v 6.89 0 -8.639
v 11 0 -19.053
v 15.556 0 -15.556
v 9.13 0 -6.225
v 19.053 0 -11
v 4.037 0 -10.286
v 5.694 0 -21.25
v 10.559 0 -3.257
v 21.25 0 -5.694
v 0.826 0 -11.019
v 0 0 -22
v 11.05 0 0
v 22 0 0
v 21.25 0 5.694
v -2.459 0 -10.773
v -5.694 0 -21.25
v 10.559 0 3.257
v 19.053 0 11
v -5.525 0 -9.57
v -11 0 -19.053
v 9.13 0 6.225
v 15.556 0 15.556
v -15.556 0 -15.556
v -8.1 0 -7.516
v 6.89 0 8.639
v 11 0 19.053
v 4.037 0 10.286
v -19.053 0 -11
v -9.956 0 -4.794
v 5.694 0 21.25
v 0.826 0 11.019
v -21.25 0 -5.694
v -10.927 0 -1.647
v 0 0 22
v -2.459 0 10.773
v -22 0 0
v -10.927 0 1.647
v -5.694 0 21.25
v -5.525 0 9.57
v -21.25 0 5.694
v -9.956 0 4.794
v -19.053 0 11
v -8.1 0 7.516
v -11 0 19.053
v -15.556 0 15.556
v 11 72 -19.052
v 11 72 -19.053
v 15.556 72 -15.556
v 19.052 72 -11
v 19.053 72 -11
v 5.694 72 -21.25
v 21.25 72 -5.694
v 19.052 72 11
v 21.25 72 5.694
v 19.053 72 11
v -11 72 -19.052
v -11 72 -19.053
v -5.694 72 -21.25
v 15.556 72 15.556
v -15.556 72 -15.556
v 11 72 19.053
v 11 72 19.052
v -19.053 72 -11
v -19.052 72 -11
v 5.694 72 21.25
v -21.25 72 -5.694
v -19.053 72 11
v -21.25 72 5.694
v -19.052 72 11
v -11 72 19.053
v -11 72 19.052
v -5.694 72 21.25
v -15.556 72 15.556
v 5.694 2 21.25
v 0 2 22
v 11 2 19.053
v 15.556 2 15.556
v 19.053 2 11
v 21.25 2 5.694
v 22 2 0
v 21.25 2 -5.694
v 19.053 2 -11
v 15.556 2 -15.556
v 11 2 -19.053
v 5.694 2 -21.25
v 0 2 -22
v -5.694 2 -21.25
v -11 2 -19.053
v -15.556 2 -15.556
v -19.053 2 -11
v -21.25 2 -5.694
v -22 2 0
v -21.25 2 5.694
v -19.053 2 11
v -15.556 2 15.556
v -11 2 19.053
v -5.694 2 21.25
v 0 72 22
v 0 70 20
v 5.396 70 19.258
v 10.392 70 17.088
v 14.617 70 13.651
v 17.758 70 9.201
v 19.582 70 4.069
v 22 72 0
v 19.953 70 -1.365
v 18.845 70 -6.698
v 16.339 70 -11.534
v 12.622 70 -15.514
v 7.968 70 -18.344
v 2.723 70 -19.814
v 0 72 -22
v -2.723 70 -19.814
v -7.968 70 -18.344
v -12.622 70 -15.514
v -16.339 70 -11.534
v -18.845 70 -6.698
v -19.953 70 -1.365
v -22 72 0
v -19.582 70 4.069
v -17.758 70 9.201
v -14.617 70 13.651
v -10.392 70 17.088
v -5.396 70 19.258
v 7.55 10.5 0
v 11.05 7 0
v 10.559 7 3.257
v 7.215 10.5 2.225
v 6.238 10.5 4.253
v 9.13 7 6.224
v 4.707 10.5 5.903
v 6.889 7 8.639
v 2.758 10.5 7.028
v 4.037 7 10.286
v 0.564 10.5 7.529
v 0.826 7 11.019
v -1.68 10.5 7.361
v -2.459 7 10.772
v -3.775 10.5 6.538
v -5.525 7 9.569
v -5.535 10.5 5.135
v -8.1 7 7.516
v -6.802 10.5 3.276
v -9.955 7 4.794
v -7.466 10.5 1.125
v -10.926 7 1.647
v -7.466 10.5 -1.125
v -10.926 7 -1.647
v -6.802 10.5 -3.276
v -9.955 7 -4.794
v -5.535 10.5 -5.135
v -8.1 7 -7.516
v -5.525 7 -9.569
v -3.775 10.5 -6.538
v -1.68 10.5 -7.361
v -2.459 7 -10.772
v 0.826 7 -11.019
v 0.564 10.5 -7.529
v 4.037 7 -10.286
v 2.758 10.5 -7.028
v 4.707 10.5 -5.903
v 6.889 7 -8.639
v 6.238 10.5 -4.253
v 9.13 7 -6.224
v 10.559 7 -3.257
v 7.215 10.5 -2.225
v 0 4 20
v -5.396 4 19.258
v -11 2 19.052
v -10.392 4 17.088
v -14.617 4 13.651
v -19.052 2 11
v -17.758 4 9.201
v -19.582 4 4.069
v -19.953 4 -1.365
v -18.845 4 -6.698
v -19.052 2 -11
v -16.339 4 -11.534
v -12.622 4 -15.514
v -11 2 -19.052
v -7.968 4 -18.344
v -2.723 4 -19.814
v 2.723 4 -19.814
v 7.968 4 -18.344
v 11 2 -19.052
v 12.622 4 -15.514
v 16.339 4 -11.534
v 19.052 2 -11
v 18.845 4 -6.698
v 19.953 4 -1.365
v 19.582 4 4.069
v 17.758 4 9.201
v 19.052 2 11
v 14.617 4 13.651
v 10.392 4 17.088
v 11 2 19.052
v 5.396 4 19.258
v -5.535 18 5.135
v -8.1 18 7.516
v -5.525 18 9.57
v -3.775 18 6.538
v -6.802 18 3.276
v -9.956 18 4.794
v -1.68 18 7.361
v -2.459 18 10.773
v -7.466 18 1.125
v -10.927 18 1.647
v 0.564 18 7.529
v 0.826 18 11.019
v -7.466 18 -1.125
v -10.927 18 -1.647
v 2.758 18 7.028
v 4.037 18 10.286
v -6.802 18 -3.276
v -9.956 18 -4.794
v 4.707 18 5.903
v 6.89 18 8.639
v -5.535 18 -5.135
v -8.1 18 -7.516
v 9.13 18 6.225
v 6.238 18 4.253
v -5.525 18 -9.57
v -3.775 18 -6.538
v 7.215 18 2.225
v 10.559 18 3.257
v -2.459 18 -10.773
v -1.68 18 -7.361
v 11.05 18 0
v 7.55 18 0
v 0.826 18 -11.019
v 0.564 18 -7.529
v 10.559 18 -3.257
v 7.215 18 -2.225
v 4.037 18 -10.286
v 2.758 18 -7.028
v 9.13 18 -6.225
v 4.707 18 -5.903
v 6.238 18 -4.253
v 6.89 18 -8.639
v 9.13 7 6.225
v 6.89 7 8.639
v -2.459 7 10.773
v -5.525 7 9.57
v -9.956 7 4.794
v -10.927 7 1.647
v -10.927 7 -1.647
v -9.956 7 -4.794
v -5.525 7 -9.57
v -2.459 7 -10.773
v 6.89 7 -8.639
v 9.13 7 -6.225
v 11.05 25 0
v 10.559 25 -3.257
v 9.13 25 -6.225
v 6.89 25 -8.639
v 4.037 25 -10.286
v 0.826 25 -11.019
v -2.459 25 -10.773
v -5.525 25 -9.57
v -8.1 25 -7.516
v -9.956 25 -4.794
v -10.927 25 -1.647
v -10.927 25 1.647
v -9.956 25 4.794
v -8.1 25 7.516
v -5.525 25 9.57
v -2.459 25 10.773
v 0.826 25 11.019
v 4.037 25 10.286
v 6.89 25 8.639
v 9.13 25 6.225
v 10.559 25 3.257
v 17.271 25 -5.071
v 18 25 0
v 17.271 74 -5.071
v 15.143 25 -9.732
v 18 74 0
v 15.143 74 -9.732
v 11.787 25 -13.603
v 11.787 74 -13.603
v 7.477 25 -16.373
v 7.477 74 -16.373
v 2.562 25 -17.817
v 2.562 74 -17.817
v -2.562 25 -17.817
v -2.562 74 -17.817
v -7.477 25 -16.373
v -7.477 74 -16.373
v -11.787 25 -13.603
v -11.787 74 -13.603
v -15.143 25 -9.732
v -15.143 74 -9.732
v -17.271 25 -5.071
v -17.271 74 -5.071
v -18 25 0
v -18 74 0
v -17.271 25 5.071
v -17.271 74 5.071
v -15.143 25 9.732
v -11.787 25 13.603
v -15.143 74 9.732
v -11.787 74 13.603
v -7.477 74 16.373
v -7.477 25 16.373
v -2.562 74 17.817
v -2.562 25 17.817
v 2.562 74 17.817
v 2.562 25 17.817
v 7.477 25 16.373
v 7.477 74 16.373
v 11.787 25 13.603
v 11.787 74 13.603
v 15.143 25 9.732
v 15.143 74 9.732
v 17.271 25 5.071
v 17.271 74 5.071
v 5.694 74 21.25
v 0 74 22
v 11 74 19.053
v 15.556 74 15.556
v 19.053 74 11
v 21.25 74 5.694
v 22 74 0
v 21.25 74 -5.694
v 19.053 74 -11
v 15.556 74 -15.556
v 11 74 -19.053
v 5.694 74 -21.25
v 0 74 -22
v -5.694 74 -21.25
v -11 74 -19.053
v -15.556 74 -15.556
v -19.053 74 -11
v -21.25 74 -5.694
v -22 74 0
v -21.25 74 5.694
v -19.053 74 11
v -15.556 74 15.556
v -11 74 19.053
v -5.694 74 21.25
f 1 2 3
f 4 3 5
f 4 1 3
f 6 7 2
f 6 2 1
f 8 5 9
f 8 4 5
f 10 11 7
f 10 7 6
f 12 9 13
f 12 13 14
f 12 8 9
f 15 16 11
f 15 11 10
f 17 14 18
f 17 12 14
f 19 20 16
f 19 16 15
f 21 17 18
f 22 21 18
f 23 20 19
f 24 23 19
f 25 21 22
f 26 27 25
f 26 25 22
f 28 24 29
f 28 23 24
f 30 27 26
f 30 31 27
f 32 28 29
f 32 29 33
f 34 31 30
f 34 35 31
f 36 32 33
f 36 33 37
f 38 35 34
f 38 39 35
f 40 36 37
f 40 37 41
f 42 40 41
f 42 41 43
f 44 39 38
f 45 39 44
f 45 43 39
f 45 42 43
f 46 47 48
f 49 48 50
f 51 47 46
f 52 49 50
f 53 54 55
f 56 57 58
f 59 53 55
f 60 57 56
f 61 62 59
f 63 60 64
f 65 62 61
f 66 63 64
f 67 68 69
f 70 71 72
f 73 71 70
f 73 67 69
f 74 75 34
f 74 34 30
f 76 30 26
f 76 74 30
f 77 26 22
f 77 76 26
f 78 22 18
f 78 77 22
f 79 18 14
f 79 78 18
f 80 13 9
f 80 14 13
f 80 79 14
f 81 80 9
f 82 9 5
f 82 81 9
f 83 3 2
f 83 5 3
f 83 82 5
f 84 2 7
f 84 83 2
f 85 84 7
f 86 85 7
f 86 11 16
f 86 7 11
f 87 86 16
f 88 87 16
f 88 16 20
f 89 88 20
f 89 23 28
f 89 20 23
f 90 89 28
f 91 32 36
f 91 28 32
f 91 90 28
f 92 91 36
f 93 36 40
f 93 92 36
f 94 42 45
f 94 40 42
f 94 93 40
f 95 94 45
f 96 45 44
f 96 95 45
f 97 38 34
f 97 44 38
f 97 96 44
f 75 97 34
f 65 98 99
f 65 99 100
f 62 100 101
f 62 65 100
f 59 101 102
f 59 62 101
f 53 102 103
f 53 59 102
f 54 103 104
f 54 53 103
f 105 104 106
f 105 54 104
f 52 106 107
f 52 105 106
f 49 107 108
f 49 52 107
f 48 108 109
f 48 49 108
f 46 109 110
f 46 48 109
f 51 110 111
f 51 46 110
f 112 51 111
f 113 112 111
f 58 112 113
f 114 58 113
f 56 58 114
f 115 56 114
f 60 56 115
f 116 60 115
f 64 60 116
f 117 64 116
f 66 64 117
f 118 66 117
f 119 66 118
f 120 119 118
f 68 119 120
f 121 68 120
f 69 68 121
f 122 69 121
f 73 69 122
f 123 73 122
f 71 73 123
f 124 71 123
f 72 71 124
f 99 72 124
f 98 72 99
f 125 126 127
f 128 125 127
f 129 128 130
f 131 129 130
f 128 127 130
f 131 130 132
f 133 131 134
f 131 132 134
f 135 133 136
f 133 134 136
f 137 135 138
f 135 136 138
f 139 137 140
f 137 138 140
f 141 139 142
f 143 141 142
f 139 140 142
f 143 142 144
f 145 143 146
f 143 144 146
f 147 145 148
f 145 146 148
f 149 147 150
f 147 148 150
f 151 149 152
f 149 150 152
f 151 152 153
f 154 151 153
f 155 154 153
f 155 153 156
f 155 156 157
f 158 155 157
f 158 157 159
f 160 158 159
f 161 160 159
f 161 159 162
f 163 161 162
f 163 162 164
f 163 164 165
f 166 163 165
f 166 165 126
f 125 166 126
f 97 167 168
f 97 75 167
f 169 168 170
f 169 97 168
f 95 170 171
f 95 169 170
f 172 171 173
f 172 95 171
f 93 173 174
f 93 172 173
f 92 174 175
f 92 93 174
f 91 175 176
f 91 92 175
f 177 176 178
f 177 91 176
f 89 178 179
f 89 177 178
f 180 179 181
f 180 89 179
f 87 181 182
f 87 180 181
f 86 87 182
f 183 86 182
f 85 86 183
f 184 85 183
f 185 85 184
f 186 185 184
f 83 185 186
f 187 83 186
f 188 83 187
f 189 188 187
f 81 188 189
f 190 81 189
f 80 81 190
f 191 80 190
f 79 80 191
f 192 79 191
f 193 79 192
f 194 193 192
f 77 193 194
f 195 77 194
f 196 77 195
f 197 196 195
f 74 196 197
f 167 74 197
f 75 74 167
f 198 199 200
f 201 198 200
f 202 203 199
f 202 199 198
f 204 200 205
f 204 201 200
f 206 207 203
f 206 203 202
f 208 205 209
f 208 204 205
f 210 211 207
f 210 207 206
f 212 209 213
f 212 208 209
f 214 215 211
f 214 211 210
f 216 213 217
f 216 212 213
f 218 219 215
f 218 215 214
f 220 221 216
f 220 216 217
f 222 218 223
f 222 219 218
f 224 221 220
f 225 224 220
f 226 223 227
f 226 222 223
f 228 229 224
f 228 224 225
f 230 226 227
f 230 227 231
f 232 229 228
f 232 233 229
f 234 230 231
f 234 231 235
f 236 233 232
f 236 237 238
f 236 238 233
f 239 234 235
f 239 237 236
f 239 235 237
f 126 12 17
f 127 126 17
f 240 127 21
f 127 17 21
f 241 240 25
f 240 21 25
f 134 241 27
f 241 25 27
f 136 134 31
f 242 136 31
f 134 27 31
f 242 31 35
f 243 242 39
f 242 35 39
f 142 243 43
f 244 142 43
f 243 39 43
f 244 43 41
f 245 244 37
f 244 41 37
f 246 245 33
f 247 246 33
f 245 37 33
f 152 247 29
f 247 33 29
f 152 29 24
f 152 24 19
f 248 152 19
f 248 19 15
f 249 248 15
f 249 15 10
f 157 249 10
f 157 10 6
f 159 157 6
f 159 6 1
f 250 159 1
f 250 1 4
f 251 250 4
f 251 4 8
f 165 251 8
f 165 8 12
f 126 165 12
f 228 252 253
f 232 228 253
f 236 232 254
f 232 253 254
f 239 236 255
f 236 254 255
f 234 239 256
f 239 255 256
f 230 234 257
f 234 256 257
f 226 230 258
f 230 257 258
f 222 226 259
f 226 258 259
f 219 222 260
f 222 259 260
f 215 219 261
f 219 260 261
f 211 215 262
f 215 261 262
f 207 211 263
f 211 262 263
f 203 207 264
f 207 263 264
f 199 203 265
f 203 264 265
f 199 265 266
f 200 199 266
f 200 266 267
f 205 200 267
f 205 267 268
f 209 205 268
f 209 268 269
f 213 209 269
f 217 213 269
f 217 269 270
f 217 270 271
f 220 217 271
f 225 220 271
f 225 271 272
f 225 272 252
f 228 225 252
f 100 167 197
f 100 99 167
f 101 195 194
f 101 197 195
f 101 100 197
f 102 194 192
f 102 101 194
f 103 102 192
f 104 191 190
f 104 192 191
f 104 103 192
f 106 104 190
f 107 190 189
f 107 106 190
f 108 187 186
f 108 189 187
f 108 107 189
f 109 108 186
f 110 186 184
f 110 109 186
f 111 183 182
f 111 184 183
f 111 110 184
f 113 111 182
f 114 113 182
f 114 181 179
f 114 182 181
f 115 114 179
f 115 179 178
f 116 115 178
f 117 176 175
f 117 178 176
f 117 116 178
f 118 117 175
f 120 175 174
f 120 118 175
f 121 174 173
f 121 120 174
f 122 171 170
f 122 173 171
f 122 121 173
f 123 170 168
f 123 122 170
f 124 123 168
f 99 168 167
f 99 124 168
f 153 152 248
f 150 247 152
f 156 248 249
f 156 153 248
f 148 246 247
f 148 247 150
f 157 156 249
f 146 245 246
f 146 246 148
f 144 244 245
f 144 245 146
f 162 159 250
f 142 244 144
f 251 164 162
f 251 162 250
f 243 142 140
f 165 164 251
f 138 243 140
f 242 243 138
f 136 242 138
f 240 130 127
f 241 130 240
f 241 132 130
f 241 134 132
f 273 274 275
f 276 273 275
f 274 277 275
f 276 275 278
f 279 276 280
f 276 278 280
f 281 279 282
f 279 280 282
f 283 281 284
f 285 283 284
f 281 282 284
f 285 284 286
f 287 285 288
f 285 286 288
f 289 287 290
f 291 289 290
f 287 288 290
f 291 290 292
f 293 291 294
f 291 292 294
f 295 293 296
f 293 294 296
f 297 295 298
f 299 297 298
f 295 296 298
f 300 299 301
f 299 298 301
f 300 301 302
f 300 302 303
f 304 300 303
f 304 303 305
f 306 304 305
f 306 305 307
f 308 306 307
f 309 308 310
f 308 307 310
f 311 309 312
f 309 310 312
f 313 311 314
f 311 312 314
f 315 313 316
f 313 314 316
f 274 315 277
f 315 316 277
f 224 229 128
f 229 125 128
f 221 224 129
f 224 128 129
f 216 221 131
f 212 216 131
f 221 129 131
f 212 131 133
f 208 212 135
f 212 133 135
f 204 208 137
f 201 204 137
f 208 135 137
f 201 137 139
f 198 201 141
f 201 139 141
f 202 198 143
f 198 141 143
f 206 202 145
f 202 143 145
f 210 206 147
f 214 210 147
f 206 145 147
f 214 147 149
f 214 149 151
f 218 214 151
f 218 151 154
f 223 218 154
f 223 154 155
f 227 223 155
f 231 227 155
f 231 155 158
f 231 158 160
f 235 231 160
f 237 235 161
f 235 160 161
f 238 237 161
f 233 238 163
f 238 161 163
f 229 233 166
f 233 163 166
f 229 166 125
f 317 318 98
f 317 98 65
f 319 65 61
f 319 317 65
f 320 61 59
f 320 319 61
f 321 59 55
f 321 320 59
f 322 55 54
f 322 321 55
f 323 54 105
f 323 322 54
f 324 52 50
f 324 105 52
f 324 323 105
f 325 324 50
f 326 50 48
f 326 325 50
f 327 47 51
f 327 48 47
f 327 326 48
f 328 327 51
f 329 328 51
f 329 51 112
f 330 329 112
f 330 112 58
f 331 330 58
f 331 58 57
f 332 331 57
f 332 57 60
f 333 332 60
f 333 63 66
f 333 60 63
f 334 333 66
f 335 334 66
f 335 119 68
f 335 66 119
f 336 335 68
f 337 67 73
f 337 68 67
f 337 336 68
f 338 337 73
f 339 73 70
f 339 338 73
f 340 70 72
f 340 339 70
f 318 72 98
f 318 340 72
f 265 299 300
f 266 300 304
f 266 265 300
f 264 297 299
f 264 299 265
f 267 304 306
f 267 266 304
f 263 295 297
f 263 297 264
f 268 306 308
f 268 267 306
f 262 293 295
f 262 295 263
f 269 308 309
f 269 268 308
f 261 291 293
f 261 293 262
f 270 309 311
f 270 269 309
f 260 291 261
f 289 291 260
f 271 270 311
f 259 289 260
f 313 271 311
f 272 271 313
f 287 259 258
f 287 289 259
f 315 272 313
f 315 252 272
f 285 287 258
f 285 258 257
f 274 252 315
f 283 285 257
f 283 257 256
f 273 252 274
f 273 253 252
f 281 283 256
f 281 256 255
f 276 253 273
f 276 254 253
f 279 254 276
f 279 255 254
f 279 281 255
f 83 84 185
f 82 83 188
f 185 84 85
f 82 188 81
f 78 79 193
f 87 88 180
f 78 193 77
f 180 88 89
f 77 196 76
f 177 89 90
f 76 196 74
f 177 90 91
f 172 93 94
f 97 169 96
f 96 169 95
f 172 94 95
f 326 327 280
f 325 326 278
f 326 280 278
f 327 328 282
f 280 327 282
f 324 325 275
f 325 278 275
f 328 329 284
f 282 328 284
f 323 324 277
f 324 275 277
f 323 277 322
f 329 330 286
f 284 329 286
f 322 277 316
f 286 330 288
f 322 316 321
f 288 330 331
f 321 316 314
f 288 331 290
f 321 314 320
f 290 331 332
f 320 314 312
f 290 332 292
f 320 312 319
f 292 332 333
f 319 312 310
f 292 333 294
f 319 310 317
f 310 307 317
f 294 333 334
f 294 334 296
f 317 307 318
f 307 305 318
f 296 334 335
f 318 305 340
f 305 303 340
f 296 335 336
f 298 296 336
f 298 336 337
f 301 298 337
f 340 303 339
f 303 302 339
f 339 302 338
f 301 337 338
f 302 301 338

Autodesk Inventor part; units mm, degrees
ref_plane "YZ Plane" through (0, 0, 0) normal (1, 0, 0) x (0, 1, 0)
ref_plane "XZ Plane" through (0, 0, 0) normal (0, 1, 0) x (-1, 0, 0)
ref_plane "XY Plane" through (0, 0, 0) normal (0, 0, 1) x (1, 0, 0)
sketch "Sketch1" plane through (0, 0, 0) normal (1, 0, 0) x (0, 1, 0)
  line L0 (0, 0) -> (0, 22)
  line L1 (0, 22) -> (2, 22)
  line L2 (2, 22) -> (2, 20)
  line L3 (2, 20) -> (72, 20)
  line L4 (72, 20) -> (72, 22)
  line L5 (72, 22) -> (74, 22)
  line L6 (74, 22) -> (74, 0)
  line L7 (74, 0) -> (0, 0)
  point P0 (74, 11)
  dimension "d0" = 22
  dimension "d5" = 70
  dimension "d6" = 2
  dimension "d7" = 2
  dimension "d29" = 2
revolve "Revolution1" add sketch "Sketch1" angle 360 about axis through (0, 74, 0) along (0, -1, 0)
chamfer "Chamfer1" distance 2 angle 45 2 edges at (0, 2, -20) (0, 72, -20)
sketch "Sketch2" plane through (0, 74, 0) normal (0, 1, 0) x (1, 0, 0)
  circle A0 centre (0, 0) radius 22 projected
  circle A1 centre (0, 0) radius 11.05
  dimension "d12" = 22.1
extrude "Extrusion1" cut sketch "Sketch2" against normal blind 56 contours A1
sketch "Sketch3" plane through (0, 0, 0) normal (0, -1, 0) x (1, 0, 0)
  circle A0 centre (0, 0) radius 22 projected
  circle A1 centre (0, 0) radius 11.05 projected
extrude "Extrusion2" cut sketch "Sketch3" against normal blind 7 contours A1
sketch "Sketch4" plane through (0, 7, 0) normal (0, -1, 0) x (1, 0, 0)
  circle A0 centre (0, 0) radius 11.05 projected
  circle A1 centre (0, 0) radius 7.55
  dimension "d18" = 15.1
extrude "Extrusion3" cut sketch "Sketch4" against normal through all contours A1
chamfer "Chamfer2" distance 3.5 angle 45 1 edges at (-7.55, 7, 0)
sketch "Sketch5" plane through (0, 74, 0) normal (0, 1, 0) x (1, 0, 0)
  circle A0 centre (0, 0) radius 11.05 projected
  circle A1 centre (0, 0) radius 20 projected
  circle A2 centre (0, 0) radius 18
  dimension "d25" = 8.95
  dimension "d26" = 2
extrude "Extrusion4" cut sketch "Sketch5" against normal blind 49 contours A2
properties part number "spool holder"
